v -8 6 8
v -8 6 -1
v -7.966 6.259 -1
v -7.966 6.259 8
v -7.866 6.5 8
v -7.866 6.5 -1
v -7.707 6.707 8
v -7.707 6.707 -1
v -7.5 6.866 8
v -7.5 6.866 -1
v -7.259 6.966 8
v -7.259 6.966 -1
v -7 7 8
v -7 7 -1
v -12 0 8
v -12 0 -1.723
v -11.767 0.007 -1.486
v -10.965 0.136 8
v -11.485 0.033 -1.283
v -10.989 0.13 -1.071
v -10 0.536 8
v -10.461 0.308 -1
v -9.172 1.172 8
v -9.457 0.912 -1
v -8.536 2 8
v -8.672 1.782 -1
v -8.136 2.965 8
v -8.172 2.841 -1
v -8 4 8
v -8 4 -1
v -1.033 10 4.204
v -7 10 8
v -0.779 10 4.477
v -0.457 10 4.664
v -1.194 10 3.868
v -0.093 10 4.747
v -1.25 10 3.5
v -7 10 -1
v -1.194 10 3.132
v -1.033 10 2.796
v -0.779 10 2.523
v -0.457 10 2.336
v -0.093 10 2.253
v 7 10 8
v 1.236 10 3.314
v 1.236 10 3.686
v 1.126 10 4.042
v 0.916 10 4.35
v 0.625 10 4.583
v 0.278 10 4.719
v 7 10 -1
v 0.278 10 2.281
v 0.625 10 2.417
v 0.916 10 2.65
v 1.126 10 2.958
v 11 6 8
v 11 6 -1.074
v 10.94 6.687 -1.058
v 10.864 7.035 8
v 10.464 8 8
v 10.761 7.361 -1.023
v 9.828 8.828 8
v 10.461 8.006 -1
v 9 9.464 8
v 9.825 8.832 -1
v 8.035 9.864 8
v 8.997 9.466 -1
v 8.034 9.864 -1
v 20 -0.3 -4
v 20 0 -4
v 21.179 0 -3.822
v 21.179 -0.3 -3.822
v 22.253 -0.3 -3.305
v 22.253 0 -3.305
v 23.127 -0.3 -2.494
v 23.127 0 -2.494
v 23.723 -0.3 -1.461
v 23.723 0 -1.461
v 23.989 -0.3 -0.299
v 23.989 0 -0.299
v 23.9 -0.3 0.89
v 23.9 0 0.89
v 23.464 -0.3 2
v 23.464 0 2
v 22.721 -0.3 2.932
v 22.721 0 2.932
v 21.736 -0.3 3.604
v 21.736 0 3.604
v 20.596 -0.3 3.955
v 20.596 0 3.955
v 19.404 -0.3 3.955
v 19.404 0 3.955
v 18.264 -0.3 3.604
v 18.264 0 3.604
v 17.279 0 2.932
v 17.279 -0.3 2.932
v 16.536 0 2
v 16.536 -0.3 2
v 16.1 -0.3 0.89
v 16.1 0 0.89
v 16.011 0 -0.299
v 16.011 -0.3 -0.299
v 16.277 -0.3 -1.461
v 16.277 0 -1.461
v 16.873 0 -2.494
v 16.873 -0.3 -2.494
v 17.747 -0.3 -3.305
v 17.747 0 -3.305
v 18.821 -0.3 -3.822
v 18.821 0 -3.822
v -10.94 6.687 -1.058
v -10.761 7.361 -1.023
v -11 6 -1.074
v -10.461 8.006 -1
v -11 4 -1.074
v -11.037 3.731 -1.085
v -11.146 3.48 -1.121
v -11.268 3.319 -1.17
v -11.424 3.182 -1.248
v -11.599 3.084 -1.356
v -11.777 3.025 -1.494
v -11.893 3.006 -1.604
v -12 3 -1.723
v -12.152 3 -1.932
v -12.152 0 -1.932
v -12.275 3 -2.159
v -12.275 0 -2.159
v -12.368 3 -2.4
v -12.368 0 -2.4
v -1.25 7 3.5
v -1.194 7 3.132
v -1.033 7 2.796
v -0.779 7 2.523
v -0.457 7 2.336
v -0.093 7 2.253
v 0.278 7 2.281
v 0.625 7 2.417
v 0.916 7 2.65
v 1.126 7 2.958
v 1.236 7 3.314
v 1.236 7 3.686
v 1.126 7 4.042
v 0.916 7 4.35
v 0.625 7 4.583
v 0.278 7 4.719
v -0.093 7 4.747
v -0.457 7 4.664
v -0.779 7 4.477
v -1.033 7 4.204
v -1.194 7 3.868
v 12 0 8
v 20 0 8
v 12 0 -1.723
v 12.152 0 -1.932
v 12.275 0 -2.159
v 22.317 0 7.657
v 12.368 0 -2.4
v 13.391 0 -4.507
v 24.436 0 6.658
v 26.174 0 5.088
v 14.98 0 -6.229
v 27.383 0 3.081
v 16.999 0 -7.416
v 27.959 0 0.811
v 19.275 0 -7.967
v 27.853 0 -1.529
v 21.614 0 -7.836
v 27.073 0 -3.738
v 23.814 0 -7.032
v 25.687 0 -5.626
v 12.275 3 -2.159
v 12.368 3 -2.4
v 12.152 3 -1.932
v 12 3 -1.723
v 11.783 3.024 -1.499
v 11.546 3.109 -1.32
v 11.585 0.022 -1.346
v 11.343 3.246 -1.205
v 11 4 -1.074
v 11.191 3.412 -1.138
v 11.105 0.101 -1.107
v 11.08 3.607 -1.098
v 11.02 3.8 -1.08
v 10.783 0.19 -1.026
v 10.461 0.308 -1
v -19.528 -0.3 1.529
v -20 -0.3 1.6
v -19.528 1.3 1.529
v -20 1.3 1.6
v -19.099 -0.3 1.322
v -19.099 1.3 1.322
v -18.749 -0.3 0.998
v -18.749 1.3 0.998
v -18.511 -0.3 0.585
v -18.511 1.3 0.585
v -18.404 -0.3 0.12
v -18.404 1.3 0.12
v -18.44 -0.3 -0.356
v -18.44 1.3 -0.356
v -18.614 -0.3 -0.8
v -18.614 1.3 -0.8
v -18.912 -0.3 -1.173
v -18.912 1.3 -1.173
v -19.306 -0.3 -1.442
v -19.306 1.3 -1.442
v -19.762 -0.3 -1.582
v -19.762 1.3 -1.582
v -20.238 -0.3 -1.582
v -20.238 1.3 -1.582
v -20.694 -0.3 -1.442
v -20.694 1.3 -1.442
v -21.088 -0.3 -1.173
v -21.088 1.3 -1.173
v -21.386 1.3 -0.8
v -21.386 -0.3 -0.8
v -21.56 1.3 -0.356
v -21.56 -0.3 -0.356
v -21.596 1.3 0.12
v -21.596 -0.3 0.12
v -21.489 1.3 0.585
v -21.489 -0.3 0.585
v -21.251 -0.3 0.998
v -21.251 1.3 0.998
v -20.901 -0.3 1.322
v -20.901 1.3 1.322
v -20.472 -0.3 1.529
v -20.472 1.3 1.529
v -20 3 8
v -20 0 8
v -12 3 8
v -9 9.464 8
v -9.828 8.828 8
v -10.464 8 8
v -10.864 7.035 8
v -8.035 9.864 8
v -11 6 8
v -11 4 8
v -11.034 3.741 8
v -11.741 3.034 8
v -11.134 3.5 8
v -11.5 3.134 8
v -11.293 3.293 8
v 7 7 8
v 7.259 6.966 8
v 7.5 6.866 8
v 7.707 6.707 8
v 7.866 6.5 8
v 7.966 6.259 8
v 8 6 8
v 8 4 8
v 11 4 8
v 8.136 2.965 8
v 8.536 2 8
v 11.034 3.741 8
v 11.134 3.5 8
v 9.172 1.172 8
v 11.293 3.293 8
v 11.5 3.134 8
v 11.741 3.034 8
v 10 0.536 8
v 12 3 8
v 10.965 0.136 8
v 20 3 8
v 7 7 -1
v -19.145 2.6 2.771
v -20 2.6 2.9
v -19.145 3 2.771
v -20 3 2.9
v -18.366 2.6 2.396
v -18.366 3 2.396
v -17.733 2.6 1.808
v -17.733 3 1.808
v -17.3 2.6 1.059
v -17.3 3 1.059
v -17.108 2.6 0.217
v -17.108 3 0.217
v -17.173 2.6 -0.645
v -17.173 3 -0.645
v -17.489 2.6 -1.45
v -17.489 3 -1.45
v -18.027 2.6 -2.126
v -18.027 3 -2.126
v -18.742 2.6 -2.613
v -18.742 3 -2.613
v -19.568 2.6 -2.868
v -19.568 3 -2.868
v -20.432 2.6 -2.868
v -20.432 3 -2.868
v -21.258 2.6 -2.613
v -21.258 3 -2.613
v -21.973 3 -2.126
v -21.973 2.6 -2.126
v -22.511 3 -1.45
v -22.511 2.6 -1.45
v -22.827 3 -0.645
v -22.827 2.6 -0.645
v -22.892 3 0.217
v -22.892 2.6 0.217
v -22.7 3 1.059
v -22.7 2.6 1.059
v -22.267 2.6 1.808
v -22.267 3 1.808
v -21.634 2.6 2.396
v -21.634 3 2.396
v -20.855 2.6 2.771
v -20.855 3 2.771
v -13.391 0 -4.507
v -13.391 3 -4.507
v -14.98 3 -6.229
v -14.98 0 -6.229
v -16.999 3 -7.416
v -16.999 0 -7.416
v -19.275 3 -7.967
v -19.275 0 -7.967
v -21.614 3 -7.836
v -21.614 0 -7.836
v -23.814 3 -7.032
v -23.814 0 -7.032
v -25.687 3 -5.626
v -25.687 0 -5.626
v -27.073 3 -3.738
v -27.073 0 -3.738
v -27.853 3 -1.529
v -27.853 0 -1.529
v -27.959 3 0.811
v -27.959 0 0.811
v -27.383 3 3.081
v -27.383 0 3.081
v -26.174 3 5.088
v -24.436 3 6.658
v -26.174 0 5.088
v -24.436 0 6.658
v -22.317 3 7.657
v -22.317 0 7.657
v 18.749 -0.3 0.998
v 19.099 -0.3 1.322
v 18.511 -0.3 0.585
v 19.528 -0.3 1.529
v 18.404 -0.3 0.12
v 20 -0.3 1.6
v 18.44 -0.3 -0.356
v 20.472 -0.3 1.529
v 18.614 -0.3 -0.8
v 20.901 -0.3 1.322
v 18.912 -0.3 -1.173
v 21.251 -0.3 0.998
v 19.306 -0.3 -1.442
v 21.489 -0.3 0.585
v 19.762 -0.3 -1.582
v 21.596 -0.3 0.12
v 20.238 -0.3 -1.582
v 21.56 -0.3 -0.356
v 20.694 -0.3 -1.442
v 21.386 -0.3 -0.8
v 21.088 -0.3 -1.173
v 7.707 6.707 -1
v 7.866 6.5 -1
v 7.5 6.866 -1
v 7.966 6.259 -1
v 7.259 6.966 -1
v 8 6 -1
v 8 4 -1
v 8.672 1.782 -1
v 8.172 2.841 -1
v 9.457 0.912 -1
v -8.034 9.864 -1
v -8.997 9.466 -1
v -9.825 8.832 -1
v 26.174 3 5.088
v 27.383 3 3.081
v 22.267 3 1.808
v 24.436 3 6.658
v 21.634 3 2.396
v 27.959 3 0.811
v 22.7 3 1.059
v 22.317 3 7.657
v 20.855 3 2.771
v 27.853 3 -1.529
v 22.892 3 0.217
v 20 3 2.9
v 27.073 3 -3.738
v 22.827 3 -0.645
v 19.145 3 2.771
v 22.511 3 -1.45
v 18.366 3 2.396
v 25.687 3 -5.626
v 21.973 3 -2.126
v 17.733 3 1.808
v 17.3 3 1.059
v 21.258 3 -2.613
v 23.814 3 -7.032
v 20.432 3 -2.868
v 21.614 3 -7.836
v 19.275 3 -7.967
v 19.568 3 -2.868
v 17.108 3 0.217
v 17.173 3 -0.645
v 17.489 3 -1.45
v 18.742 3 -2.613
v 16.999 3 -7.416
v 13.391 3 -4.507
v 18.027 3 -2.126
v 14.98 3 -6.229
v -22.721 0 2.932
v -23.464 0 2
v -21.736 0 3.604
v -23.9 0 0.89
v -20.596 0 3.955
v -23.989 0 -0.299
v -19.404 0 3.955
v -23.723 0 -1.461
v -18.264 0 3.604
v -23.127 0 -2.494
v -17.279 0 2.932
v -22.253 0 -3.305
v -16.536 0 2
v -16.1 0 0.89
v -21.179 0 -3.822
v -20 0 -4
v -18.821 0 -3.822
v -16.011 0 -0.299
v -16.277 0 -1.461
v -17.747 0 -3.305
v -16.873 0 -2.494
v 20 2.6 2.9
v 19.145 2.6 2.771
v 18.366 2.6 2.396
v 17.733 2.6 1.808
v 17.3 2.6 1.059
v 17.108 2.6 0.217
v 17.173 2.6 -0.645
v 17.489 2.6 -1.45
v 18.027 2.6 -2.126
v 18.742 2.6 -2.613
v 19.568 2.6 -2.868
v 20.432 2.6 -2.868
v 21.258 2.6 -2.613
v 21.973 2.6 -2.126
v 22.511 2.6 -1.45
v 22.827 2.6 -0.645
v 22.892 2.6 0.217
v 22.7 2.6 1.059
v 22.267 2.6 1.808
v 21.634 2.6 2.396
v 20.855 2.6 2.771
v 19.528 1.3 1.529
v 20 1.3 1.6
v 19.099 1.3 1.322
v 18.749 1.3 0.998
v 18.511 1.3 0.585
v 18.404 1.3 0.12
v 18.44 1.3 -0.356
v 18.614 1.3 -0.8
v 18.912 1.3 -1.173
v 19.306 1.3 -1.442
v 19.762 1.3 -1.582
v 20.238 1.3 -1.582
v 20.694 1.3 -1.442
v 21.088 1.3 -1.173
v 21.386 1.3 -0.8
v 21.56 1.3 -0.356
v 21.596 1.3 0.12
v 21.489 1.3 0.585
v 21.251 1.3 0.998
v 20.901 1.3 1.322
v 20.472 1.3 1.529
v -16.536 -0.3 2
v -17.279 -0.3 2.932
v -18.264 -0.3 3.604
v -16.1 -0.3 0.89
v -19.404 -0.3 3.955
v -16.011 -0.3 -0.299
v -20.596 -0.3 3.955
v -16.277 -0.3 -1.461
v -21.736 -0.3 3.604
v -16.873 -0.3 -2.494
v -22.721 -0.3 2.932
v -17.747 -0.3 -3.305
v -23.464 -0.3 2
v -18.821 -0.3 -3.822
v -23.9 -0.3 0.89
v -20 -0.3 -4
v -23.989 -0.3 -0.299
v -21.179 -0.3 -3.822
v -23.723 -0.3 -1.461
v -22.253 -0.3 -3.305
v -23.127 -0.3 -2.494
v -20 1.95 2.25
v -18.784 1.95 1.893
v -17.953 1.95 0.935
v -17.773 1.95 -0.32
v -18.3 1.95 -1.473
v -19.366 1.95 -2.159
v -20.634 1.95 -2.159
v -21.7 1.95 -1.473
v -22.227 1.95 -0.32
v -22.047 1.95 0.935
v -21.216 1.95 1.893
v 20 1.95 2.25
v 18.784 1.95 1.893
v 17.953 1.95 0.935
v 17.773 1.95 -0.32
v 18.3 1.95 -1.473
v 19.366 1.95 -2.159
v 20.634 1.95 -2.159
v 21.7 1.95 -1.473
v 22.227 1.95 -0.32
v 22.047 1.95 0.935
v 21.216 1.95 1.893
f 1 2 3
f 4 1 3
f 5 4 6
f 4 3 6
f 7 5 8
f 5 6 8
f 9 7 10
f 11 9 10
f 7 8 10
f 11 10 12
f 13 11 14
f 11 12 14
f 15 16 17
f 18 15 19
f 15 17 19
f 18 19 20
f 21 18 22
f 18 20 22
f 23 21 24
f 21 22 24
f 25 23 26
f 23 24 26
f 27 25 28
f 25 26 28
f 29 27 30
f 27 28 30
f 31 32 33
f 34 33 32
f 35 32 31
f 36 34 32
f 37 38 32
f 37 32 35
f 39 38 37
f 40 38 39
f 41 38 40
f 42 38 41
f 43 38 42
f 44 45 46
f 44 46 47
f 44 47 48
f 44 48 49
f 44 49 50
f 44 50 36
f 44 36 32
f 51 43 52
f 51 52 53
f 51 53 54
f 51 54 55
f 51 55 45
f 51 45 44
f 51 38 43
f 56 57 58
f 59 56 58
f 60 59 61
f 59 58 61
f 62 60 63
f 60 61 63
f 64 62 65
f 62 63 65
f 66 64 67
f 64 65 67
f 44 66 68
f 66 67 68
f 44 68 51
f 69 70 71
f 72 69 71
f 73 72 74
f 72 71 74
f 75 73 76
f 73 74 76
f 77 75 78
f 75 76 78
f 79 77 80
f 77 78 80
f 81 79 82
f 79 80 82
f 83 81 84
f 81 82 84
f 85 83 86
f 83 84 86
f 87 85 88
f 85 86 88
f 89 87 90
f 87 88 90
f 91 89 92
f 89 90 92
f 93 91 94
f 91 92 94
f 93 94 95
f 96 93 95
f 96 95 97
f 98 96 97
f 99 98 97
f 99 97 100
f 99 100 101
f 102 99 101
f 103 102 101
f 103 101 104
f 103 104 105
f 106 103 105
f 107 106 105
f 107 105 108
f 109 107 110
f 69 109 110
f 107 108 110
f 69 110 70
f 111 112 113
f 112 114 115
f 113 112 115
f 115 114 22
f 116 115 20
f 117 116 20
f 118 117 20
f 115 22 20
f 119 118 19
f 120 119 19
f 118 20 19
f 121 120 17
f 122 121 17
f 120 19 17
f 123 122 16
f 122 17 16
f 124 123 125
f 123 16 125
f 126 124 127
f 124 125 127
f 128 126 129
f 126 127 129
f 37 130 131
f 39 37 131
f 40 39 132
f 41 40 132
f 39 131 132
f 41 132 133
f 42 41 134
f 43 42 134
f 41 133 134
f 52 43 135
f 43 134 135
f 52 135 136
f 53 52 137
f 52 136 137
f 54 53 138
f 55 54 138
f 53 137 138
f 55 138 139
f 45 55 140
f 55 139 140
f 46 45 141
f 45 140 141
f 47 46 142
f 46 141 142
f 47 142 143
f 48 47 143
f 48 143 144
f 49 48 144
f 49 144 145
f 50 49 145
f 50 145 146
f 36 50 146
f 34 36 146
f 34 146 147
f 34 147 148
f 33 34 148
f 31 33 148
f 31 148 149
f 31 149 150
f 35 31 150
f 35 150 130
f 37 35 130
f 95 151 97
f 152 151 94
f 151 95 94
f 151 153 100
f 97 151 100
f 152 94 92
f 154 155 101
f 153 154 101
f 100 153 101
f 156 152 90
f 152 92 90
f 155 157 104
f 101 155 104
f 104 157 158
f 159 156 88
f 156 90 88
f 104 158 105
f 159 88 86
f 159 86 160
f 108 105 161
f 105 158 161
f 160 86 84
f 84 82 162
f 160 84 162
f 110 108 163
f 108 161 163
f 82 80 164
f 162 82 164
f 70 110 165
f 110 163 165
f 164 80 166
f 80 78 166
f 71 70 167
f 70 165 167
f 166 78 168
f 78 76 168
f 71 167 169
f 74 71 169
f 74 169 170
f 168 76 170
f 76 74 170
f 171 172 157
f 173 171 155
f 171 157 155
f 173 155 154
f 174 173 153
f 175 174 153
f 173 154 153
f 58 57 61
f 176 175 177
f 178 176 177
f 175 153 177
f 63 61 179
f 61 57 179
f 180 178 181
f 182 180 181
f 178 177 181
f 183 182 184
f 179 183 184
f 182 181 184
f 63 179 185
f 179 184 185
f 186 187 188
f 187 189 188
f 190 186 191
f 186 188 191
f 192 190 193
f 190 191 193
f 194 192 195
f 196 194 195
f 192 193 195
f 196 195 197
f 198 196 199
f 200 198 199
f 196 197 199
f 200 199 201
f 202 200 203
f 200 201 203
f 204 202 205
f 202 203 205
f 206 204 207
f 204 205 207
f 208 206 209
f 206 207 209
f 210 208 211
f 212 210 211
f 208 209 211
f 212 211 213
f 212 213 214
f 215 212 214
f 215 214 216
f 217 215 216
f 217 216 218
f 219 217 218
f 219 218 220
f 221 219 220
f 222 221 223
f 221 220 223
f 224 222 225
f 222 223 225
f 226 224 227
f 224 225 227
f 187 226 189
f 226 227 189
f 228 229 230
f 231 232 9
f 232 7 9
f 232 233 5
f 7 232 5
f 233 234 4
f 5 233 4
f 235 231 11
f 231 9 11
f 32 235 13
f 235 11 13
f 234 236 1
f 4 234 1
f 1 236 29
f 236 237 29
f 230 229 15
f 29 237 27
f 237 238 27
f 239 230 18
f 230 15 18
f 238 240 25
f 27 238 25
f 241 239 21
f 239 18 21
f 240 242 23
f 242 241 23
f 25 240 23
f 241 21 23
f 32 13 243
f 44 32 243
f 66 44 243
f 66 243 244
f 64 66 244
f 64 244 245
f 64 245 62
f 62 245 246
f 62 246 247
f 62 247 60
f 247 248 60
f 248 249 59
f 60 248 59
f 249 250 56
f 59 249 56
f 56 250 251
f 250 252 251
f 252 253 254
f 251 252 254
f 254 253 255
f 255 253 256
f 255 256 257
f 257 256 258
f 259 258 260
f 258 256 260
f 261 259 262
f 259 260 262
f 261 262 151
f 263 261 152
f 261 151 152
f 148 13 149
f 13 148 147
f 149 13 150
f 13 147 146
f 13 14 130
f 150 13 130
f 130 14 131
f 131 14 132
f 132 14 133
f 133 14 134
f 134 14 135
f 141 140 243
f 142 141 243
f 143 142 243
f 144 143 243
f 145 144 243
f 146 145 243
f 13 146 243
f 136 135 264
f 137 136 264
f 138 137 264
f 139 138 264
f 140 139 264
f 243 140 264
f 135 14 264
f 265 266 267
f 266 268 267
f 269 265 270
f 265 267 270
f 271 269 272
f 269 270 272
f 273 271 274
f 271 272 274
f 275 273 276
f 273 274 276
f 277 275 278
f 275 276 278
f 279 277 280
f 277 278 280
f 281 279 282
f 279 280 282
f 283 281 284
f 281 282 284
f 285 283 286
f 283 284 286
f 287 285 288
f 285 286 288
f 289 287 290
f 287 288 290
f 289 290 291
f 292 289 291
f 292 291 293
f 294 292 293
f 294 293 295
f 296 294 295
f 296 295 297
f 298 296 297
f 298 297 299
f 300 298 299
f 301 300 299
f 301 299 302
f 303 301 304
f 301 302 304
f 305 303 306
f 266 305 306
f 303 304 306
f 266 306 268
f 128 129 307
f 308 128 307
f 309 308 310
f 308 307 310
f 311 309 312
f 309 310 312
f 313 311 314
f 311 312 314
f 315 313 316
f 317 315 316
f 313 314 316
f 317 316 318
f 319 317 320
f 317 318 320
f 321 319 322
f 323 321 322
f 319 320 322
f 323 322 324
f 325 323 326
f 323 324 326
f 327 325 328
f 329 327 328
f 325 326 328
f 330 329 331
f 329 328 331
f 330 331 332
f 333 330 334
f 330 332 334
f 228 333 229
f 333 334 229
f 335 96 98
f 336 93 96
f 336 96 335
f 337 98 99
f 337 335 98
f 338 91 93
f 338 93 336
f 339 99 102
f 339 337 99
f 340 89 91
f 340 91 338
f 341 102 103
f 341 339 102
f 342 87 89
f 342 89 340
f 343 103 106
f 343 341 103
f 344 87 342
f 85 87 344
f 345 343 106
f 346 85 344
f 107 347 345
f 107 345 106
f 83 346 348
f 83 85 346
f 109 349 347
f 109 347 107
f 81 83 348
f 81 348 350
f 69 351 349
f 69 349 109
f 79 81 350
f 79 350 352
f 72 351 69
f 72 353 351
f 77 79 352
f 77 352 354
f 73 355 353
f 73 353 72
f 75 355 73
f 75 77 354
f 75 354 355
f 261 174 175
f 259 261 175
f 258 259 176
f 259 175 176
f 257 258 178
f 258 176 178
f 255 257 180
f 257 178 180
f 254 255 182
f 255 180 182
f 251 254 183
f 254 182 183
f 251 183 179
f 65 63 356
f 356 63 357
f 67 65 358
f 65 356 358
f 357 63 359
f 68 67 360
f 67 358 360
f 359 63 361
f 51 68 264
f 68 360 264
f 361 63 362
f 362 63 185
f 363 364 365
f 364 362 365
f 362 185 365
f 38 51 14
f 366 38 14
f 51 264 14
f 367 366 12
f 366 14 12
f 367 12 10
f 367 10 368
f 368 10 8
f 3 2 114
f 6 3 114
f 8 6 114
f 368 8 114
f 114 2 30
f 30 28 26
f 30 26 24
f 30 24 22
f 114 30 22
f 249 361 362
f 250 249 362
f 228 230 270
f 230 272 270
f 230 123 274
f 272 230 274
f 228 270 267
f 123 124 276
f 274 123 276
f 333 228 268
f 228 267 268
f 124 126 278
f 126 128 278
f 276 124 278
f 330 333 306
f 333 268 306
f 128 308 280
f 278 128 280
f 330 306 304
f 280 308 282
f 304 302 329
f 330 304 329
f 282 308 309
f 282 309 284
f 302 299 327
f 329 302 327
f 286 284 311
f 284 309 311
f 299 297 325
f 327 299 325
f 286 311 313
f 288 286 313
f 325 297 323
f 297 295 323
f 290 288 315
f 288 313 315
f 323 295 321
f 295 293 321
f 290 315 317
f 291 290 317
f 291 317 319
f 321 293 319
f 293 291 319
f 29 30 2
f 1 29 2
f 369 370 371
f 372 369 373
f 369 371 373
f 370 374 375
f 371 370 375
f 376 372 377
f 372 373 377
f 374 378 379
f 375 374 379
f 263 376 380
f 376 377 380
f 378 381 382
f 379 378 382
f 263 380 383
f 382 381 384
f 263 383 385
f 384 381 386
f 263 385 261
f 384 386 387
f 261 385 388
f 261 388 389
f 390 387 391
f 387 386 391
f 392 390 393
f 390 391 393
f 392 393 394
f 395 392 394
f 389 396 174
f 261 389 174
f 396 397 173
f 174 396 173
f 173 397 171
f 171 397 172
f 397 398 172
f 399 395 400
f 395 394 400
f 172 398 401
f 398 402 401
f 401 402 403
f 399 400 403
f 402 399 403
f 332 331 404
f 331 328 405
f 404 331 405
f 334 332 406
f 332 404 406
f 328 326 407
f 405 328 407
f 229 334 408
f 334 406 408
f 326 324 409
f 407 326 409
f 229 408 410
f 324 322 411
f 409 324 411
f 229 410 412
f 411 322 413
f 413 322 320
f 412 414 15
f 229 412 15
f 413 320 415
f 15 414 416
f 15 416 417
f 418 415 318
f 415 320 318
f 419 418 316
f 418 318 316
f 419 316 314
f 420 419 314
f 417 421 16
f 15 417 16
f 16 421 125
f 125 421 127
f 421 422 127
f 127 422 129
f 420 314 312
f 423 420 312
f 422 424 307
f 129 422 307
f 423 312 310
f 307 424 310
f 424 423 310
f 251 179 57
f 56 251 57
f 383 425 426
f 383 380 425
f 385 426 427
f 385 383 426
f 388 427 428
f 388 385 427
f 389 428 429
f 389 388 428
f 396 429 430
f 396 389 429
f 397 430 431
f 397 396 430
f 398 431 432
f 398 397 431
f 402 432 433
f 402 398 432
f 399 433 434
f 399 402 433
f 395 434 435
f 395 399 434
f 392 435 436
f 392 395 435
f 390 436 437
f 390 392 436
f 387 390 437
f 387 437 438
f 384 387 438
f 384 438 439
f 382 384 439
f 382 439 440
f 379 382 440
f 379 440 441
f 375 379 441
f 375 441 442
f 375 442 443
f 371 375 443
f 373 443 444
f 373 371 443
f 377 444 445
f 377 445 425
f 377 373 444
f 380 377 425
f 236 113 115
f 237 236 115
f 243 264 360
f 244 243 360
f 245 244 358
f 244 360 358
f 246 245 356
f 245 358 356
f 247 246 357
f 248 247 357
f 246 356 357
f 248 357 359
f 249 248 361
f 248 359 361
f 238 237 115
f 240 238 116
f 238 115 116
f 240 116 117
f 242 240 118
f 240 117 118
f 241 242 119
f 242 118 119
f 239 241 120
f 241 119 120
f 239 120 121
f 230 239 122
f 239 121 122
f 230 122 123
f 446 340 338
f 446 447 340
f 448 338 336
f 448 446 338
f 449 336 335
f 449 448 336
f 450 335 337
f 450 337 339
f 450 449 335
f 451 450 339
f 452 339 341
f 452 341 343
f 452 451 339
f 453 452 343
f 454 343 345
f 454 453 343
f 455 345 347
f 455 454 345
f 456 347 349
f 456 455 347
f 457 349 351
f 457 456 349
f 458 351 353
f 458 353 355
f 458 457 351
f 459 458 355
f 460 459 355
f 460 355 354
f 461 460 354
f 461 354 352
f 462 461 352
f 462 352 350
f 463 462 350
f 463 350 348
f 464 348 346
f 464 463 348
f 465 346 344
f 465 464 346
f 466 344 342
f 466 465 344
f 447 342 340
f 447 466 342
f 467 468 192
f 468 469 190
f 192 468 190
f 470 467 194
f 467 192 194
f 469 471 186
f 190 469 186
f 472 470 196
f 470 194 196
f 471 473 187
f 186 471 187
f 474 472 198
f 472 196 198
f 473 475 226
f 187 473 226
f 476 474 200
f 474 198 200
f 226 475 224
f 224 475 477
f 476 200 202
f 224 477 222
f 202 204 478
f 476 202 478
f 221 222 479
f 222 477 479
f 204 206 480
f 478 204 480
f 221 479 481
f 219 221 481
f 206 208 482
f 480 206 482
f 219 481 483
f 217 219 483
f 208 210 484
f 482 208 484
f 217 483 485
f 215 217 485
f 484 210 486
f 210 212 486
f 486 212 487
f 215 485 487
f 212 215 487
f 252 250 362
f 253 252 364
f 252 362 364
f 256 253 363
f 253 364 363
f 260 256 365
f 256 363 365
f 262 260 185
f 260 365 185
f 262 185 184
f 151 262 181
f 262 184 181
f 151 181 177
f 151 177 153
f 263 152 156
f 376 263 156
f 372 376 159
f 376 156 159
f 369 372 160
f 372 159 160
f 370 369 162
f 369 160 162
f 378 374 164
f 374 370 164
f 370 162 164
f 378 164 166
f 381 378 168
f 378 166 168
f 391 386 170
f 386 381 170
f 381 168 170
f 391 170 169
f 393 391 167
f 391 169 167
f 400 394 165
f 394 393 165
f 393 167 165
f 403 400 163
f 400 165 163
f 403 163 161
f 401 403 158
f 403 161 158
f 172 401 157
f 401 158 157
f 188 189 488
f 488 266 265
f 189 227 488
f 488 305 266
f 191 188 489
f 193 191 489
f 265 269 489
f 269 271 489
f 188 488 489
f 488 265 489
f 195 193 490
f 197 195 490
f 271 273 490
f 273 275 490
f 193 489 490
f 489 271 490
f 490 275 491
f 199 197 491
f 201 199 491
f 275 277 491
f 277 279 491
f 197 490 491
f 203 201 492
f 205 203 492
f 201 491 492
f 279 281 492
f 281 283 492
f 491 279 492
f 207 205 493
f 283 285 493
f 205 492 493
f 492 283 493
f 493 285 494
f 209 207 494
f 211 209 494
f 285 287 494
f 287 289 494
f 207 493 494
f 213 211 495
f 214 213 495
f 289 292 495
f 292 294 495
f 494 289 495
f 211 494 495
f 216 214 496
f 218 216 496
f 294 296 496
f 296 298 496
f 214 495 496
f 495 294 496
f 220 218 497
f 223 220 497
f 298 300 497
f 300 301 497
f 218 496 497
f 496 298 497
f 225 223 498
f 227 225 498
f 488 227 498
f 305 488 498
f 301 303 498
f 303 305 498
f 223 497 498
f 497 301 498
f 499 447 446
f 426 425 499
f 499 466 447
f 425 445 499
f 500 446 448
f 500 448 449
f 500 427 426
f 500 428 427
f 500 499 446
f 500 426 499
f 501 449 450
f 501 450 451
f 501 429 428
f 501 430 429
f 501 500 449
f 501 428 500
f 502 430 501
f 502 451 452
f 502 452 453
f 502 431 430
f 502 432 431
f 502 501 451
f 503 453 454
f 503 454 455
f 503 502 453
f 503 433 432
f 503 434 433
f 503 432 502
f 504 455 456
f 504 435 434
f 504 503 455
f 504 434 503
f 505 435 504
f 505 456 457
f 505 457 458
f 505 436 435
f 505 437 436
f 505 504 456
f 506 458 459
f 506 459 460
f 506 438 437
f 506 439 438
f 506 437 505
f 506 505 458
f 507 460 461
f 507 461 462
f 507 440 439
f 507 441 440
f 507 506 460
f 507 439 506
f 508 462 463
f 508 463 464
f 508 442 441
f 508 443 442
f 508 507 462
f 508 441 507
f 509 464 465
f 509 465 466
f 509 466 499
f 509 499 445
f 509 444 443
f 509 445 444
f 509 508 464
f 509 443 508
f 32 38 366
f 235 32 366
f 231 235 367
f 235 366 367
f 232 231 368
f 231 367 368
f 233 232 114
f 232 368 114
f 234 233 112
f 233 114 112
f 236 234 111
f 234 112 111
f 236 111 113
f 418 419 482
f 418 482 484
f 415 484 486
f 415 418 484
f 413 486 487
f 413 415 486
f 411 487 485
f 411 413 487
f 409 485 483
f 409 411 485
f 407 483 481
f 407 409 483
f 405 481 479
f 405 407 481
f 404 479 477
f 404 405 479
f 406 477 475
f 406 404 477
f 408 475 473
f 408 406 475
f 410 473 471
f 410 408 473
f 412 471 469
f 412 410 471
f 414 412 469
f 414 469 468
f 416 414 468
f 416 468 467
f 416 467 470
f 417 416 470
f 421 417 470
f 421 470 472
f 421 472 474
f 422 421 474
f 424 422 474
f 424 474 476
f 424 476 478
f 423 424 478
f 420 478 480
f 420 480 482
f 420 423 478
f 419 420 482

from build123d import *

# Parameters (mm, degrees)
BOSS_EXTRU_1_DEPTH           = 10
ENL_V_MAT_EXTRU_1_DEPTH      = 31.789608707
ENL_V_MAT_EXTRU_1_DEPTH_BACK = 31.789608707
ESQUISSE2_OUTSIDE_W          = 69.818
ESQUISSE2_OUTSIDE_H          = 23.818
ESQUISSE3_R                  = 4
BOSS_EXTRU_2_DEPTH           = 0.3
TROU_TARAUD_M31_D            = 2.5


with BuildPart() as part:
    # Esquisse1 → Boss.-Extru.1 (new body)
    with BuildSketch(Plane(origin=(0, 0, 0), x_dir=(1, 0, 0), z_dir=(0, 1, 0))):
        with BuildLine():
            Line((-20, -7.99999973), (20, -7.99999973))
            ThreePointArc((20, -7.99999973), (26.449806199, 4.732864097), (12.368486389, 2.40000027))
            ThreePointArc((12.368486389, 2.40000027), (11.643823942, 1.38754872), (10.460607986, 1.00000027))
            Line((10.460607986, 1.00000027), (-10.460607986, 1.00000027))
            ThreePointArc((-10.460607986, 1.00000027), (-11.643823942, 1.38754872), (-12.368486389, 2.40000027))
            ThreePointArc((-12.368486389, 2.40000027), (-26.449806199, 4.732864097), (-20, -7.99999973))
        make_face()
    extrude(amount=BOSS_EXTRU_1_DEPTH)

    # Esquisse2 outside → Enlèv. mat.-Extru.1 (cut, two sides: drawn at the far end of the back side and taken through both)
    with BuildSketch(Plane.XY.offset(-ENL_V_MAT_EXTRU_1_DEPTH_BACK)):
        with Locations((0, 5)):
            Rectangle(ESQUISSE2_OUTSIDE_W, ESQUISSE2_OUTSIDE_H)
        with BuildLine():
            Line((7, 10), (-7, 10))
            ThreePointArc((-7, 10), (-9.828427125, 8.828427125), (-11, 6))
            Line((-11, 6), (-11, 4))
            ThreePointArc((-11, 4), (-11.292893219, 3.292893219), (-12, 3))
            Line((-12, 3), (-28, 3))
            Line((-28, 3), (-28, 0))
            Line((-28, 0), (-12, 0))
            ThreePointArc((-12, 0), (-9.171572875, 1.171572875), (-8, 4))
            Line((-8, 4), (-8, 6))
            ThreePointArc((-8, 6), (-7.707106781, 6.707106781), (-7, 7))
            Line((-7, 7), (7, 7))
            ThreePointArc((7, 7), (7.707106781, 6.707106781), (8, 6))
            Line((8, 6), (8, 4))
            ThreePointArc((8, 4), (9.171572875, 1.171572875), (12, 0))
            Line((12, 0), (28, 0))
            Line((28, 0), (28, 3))
            Line((28, 3), (12, 3))
            ThreePointArc((12, 3), (11.292893219, 3.292893219), (11, 4))
            Line((11, 4), (11, 6))
            ThreePointArc((11, 6), (9.828427125, 8.828427125), (7, 10))
        make_face(mode=Mode.SUBTRACT)
    extrude(amount=ENL_V_MAT_EXTRU_1_DEPTH + ENL_V_MAT_EXTRU_1_DEPTH_BACK, mode=Mode.SUBTRACT)

    # Esquisse3 → Boss.-Extru.2 (add)
    with BuildSketch(Plane.XZ):
        with Locations(Location((20, -2.7e-07, 0), (0, 0, 270))):
            Circle(ESQUISSE3_R)
    boss_extru_2 = extrude(amount=BOSS_EXTRU_2_DEPTH)

    # Esquisse4 → Fraisage pour vis à tête fraisée à 6 pans creux M31 (revolve, cut)
    with BuildSketch(Plane(origin=(20, 3, -2.7e-07), x_dir=(0, 0, 1), z_dir=(1, 0, 0))):
        Polygon((0, 0), (0, 3.3), (1.6, 3.3), (1.6, 1.7), (2.9, 0.4), (2.9, 0), align=None)
    fraisage_pour_vis_t_te_frais_e_6_pan = revolve(axis=Axis((20, 9.35, -2.7e-07), (0, -1, 0)), mode=Mode.SUBTRACT)

    # Trou taraudé M31 (through all)
    with Locations(Plane(origin=(0, 10, 0), x_dir=(1, 0, 0), z_dir=(0, 1, 0))):
        with Locations((0, -3.5)):
            Hole(TROU_TARAUD_M31_D / 2)

    # Symétrie1: Boss.-Extru.2, Fraisage pour vis à tête fraisée à 6 pans creux M31 across plane
    add(boss_extru_2.mirror(Plane(origin=(0, 0, 0), x_dir=(0, 0, 1), z_dir=(1, 0, 0))))
    add(fraisage_pour_vis_t_te_frais_e_6_pan.mirror(Plane(origin=(0, 0, 0), x_dir=(0, 0, 1), z_dir=(1, 0, 0))), mode=Mode.SUBTRACT)


solid = part.part
